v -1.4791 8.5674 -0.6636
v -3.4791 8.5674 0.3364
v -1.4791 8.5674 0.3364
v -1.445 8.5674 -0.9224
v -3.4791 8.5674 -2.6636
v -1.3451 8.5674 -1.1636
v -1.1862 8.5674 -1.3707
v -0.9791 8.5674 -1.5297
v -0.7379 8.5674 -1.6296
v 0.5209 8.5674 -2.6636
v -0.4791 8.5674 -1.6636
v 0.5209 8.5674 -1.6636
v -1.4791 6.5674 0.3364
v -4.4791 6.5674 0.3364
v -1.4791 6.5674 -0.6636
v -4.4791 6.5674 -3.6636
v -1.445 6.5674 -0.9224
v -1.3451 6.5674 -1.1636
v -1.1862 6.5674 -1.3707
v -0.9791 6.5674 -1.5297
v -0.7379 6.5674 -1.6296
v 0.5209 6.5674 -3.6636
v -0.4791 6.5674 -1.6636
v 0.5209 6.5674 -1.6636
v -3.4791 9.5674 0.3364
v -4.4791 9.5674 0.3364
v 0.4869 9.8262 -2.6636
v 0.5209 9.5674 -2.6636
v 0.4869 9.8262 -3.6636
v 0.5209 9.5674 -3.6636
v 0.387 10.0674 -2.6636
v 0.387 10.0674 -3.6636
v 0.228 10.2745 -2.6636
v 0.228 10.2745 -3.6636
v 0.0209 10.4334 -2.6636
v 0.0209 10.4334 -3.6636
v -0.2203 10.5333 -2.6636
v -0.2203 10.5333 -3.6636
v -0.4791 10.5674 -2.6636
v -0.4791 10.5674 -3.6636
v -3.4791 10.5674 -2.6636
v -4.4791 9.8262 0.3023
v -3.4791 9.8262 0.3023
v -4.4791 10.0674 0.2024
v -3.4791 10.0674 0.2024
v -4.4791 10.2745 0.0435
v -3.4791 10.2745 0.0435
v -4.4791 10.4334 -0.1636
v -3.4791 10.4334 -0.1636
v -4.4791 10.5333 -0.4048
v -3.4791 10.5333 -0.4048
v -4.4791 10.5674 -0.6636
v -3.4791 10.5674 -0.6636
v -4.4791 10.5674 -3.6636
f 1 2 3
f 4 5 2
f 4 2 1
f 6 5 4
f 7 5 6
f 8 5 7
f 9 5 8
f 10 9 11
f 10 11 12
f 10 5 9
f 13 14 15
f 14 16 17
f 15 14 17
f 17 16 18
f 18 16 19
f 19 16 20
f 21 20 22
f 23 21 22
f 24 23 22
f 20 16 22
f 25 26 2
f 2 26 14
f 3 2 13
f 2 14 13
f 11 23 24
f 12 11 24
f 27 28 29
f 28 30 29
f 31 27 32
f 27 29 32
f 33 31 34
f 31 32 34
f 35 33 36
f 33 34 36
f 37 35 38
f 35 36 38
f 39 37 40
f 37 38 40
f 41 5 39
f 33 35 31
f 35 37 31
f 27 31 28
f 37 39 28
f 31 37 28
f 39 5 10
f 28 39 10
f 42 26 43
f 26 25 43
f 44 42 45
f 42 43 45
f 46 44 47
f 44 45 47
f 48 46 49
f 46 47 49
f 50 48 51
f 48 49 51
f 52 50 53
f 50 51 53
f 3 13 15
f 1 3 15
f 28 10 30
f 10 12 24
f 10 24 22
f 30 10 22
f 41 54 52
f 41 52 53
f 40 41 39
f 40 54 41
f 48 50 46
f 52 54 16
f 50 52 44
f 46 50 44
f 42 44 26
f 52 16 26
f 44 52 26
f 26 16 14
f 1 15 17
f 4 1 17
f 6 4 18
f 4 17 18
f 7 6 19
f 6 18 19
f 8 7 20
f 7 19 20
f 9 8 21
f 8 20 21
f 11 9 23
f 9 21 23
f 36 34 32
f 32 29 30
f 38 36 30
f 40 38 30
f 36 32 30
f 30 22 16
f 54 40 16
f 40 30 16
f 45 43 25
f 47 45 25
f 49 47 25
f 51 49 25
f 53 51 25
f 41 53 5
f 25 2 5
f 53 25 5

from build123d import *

# Parameters (mm, degrees)
EXTRUDE_1_DEPTH = 10
EXTRUDE_2_DEPTH = 20
FILLET_1_R      = 5
SCALE_1_SCALE   = 0.2


with BuildPart() as part:
    # 草圖1 → 填料-伸長1 (new body)
    with BuildSketch(Plane(origin=(0, 0, 0), x_dir=(1, 0, 0), z_dir=(0, 1, 0))):
        with BuildLine():
            Line((-12.5, -10), (2.5, -10))
            Line((2.5, -10), (2.5, -5))
            ThreePointArc((2.5, -5), (3.964466094, -1.464466094), (7.5, 0))
            Line((7.5, 0), (12.5, 0))
            Line((12.5, 0), (12.5, 10))
            Line((12.5, 10), (-12.5, 10))
            Line((-12.5, 10), (-12.5, -10))
        make_face()
    extrude(amount=EXTRUDE_1_DEPTH)

    # 草圖1<3> → 填料-伸長2 (add)
    with BuildSketch(Plane(origin=(0, 0, 0), x_dir=(1, 0, 0), z_dir=(0, 1, 0))):
        Polygon((-12.5, 5), (-12.5, -10), (-7.5, -10), (-7.5, 5), (12.5, 5), (12.5, 10), (-7.5, 10), (-12.5, 10), align=None)
    extrude(amount=EXTRUDE_2_DEPTH)

    # 圓角1
    fillet_1_edges = [part.edges().sort_by_distance(p)[0] for p in [
        (-10, 20, 10),
        (12.5, 20, -7.5),
    ]]
    fillet(fillet_1_edges, radius=FILLET_1_R)


with BuildPart() as part_1:
    # 縮放比例1: scaled about (-2.47384308, 8.209193679, -2.079530772)
    add(part.part.scale(SCALE_1_SCALE).moved(Location((-1.979074464, 6.567354943, -1.663624618))))


solid = part_1.part
